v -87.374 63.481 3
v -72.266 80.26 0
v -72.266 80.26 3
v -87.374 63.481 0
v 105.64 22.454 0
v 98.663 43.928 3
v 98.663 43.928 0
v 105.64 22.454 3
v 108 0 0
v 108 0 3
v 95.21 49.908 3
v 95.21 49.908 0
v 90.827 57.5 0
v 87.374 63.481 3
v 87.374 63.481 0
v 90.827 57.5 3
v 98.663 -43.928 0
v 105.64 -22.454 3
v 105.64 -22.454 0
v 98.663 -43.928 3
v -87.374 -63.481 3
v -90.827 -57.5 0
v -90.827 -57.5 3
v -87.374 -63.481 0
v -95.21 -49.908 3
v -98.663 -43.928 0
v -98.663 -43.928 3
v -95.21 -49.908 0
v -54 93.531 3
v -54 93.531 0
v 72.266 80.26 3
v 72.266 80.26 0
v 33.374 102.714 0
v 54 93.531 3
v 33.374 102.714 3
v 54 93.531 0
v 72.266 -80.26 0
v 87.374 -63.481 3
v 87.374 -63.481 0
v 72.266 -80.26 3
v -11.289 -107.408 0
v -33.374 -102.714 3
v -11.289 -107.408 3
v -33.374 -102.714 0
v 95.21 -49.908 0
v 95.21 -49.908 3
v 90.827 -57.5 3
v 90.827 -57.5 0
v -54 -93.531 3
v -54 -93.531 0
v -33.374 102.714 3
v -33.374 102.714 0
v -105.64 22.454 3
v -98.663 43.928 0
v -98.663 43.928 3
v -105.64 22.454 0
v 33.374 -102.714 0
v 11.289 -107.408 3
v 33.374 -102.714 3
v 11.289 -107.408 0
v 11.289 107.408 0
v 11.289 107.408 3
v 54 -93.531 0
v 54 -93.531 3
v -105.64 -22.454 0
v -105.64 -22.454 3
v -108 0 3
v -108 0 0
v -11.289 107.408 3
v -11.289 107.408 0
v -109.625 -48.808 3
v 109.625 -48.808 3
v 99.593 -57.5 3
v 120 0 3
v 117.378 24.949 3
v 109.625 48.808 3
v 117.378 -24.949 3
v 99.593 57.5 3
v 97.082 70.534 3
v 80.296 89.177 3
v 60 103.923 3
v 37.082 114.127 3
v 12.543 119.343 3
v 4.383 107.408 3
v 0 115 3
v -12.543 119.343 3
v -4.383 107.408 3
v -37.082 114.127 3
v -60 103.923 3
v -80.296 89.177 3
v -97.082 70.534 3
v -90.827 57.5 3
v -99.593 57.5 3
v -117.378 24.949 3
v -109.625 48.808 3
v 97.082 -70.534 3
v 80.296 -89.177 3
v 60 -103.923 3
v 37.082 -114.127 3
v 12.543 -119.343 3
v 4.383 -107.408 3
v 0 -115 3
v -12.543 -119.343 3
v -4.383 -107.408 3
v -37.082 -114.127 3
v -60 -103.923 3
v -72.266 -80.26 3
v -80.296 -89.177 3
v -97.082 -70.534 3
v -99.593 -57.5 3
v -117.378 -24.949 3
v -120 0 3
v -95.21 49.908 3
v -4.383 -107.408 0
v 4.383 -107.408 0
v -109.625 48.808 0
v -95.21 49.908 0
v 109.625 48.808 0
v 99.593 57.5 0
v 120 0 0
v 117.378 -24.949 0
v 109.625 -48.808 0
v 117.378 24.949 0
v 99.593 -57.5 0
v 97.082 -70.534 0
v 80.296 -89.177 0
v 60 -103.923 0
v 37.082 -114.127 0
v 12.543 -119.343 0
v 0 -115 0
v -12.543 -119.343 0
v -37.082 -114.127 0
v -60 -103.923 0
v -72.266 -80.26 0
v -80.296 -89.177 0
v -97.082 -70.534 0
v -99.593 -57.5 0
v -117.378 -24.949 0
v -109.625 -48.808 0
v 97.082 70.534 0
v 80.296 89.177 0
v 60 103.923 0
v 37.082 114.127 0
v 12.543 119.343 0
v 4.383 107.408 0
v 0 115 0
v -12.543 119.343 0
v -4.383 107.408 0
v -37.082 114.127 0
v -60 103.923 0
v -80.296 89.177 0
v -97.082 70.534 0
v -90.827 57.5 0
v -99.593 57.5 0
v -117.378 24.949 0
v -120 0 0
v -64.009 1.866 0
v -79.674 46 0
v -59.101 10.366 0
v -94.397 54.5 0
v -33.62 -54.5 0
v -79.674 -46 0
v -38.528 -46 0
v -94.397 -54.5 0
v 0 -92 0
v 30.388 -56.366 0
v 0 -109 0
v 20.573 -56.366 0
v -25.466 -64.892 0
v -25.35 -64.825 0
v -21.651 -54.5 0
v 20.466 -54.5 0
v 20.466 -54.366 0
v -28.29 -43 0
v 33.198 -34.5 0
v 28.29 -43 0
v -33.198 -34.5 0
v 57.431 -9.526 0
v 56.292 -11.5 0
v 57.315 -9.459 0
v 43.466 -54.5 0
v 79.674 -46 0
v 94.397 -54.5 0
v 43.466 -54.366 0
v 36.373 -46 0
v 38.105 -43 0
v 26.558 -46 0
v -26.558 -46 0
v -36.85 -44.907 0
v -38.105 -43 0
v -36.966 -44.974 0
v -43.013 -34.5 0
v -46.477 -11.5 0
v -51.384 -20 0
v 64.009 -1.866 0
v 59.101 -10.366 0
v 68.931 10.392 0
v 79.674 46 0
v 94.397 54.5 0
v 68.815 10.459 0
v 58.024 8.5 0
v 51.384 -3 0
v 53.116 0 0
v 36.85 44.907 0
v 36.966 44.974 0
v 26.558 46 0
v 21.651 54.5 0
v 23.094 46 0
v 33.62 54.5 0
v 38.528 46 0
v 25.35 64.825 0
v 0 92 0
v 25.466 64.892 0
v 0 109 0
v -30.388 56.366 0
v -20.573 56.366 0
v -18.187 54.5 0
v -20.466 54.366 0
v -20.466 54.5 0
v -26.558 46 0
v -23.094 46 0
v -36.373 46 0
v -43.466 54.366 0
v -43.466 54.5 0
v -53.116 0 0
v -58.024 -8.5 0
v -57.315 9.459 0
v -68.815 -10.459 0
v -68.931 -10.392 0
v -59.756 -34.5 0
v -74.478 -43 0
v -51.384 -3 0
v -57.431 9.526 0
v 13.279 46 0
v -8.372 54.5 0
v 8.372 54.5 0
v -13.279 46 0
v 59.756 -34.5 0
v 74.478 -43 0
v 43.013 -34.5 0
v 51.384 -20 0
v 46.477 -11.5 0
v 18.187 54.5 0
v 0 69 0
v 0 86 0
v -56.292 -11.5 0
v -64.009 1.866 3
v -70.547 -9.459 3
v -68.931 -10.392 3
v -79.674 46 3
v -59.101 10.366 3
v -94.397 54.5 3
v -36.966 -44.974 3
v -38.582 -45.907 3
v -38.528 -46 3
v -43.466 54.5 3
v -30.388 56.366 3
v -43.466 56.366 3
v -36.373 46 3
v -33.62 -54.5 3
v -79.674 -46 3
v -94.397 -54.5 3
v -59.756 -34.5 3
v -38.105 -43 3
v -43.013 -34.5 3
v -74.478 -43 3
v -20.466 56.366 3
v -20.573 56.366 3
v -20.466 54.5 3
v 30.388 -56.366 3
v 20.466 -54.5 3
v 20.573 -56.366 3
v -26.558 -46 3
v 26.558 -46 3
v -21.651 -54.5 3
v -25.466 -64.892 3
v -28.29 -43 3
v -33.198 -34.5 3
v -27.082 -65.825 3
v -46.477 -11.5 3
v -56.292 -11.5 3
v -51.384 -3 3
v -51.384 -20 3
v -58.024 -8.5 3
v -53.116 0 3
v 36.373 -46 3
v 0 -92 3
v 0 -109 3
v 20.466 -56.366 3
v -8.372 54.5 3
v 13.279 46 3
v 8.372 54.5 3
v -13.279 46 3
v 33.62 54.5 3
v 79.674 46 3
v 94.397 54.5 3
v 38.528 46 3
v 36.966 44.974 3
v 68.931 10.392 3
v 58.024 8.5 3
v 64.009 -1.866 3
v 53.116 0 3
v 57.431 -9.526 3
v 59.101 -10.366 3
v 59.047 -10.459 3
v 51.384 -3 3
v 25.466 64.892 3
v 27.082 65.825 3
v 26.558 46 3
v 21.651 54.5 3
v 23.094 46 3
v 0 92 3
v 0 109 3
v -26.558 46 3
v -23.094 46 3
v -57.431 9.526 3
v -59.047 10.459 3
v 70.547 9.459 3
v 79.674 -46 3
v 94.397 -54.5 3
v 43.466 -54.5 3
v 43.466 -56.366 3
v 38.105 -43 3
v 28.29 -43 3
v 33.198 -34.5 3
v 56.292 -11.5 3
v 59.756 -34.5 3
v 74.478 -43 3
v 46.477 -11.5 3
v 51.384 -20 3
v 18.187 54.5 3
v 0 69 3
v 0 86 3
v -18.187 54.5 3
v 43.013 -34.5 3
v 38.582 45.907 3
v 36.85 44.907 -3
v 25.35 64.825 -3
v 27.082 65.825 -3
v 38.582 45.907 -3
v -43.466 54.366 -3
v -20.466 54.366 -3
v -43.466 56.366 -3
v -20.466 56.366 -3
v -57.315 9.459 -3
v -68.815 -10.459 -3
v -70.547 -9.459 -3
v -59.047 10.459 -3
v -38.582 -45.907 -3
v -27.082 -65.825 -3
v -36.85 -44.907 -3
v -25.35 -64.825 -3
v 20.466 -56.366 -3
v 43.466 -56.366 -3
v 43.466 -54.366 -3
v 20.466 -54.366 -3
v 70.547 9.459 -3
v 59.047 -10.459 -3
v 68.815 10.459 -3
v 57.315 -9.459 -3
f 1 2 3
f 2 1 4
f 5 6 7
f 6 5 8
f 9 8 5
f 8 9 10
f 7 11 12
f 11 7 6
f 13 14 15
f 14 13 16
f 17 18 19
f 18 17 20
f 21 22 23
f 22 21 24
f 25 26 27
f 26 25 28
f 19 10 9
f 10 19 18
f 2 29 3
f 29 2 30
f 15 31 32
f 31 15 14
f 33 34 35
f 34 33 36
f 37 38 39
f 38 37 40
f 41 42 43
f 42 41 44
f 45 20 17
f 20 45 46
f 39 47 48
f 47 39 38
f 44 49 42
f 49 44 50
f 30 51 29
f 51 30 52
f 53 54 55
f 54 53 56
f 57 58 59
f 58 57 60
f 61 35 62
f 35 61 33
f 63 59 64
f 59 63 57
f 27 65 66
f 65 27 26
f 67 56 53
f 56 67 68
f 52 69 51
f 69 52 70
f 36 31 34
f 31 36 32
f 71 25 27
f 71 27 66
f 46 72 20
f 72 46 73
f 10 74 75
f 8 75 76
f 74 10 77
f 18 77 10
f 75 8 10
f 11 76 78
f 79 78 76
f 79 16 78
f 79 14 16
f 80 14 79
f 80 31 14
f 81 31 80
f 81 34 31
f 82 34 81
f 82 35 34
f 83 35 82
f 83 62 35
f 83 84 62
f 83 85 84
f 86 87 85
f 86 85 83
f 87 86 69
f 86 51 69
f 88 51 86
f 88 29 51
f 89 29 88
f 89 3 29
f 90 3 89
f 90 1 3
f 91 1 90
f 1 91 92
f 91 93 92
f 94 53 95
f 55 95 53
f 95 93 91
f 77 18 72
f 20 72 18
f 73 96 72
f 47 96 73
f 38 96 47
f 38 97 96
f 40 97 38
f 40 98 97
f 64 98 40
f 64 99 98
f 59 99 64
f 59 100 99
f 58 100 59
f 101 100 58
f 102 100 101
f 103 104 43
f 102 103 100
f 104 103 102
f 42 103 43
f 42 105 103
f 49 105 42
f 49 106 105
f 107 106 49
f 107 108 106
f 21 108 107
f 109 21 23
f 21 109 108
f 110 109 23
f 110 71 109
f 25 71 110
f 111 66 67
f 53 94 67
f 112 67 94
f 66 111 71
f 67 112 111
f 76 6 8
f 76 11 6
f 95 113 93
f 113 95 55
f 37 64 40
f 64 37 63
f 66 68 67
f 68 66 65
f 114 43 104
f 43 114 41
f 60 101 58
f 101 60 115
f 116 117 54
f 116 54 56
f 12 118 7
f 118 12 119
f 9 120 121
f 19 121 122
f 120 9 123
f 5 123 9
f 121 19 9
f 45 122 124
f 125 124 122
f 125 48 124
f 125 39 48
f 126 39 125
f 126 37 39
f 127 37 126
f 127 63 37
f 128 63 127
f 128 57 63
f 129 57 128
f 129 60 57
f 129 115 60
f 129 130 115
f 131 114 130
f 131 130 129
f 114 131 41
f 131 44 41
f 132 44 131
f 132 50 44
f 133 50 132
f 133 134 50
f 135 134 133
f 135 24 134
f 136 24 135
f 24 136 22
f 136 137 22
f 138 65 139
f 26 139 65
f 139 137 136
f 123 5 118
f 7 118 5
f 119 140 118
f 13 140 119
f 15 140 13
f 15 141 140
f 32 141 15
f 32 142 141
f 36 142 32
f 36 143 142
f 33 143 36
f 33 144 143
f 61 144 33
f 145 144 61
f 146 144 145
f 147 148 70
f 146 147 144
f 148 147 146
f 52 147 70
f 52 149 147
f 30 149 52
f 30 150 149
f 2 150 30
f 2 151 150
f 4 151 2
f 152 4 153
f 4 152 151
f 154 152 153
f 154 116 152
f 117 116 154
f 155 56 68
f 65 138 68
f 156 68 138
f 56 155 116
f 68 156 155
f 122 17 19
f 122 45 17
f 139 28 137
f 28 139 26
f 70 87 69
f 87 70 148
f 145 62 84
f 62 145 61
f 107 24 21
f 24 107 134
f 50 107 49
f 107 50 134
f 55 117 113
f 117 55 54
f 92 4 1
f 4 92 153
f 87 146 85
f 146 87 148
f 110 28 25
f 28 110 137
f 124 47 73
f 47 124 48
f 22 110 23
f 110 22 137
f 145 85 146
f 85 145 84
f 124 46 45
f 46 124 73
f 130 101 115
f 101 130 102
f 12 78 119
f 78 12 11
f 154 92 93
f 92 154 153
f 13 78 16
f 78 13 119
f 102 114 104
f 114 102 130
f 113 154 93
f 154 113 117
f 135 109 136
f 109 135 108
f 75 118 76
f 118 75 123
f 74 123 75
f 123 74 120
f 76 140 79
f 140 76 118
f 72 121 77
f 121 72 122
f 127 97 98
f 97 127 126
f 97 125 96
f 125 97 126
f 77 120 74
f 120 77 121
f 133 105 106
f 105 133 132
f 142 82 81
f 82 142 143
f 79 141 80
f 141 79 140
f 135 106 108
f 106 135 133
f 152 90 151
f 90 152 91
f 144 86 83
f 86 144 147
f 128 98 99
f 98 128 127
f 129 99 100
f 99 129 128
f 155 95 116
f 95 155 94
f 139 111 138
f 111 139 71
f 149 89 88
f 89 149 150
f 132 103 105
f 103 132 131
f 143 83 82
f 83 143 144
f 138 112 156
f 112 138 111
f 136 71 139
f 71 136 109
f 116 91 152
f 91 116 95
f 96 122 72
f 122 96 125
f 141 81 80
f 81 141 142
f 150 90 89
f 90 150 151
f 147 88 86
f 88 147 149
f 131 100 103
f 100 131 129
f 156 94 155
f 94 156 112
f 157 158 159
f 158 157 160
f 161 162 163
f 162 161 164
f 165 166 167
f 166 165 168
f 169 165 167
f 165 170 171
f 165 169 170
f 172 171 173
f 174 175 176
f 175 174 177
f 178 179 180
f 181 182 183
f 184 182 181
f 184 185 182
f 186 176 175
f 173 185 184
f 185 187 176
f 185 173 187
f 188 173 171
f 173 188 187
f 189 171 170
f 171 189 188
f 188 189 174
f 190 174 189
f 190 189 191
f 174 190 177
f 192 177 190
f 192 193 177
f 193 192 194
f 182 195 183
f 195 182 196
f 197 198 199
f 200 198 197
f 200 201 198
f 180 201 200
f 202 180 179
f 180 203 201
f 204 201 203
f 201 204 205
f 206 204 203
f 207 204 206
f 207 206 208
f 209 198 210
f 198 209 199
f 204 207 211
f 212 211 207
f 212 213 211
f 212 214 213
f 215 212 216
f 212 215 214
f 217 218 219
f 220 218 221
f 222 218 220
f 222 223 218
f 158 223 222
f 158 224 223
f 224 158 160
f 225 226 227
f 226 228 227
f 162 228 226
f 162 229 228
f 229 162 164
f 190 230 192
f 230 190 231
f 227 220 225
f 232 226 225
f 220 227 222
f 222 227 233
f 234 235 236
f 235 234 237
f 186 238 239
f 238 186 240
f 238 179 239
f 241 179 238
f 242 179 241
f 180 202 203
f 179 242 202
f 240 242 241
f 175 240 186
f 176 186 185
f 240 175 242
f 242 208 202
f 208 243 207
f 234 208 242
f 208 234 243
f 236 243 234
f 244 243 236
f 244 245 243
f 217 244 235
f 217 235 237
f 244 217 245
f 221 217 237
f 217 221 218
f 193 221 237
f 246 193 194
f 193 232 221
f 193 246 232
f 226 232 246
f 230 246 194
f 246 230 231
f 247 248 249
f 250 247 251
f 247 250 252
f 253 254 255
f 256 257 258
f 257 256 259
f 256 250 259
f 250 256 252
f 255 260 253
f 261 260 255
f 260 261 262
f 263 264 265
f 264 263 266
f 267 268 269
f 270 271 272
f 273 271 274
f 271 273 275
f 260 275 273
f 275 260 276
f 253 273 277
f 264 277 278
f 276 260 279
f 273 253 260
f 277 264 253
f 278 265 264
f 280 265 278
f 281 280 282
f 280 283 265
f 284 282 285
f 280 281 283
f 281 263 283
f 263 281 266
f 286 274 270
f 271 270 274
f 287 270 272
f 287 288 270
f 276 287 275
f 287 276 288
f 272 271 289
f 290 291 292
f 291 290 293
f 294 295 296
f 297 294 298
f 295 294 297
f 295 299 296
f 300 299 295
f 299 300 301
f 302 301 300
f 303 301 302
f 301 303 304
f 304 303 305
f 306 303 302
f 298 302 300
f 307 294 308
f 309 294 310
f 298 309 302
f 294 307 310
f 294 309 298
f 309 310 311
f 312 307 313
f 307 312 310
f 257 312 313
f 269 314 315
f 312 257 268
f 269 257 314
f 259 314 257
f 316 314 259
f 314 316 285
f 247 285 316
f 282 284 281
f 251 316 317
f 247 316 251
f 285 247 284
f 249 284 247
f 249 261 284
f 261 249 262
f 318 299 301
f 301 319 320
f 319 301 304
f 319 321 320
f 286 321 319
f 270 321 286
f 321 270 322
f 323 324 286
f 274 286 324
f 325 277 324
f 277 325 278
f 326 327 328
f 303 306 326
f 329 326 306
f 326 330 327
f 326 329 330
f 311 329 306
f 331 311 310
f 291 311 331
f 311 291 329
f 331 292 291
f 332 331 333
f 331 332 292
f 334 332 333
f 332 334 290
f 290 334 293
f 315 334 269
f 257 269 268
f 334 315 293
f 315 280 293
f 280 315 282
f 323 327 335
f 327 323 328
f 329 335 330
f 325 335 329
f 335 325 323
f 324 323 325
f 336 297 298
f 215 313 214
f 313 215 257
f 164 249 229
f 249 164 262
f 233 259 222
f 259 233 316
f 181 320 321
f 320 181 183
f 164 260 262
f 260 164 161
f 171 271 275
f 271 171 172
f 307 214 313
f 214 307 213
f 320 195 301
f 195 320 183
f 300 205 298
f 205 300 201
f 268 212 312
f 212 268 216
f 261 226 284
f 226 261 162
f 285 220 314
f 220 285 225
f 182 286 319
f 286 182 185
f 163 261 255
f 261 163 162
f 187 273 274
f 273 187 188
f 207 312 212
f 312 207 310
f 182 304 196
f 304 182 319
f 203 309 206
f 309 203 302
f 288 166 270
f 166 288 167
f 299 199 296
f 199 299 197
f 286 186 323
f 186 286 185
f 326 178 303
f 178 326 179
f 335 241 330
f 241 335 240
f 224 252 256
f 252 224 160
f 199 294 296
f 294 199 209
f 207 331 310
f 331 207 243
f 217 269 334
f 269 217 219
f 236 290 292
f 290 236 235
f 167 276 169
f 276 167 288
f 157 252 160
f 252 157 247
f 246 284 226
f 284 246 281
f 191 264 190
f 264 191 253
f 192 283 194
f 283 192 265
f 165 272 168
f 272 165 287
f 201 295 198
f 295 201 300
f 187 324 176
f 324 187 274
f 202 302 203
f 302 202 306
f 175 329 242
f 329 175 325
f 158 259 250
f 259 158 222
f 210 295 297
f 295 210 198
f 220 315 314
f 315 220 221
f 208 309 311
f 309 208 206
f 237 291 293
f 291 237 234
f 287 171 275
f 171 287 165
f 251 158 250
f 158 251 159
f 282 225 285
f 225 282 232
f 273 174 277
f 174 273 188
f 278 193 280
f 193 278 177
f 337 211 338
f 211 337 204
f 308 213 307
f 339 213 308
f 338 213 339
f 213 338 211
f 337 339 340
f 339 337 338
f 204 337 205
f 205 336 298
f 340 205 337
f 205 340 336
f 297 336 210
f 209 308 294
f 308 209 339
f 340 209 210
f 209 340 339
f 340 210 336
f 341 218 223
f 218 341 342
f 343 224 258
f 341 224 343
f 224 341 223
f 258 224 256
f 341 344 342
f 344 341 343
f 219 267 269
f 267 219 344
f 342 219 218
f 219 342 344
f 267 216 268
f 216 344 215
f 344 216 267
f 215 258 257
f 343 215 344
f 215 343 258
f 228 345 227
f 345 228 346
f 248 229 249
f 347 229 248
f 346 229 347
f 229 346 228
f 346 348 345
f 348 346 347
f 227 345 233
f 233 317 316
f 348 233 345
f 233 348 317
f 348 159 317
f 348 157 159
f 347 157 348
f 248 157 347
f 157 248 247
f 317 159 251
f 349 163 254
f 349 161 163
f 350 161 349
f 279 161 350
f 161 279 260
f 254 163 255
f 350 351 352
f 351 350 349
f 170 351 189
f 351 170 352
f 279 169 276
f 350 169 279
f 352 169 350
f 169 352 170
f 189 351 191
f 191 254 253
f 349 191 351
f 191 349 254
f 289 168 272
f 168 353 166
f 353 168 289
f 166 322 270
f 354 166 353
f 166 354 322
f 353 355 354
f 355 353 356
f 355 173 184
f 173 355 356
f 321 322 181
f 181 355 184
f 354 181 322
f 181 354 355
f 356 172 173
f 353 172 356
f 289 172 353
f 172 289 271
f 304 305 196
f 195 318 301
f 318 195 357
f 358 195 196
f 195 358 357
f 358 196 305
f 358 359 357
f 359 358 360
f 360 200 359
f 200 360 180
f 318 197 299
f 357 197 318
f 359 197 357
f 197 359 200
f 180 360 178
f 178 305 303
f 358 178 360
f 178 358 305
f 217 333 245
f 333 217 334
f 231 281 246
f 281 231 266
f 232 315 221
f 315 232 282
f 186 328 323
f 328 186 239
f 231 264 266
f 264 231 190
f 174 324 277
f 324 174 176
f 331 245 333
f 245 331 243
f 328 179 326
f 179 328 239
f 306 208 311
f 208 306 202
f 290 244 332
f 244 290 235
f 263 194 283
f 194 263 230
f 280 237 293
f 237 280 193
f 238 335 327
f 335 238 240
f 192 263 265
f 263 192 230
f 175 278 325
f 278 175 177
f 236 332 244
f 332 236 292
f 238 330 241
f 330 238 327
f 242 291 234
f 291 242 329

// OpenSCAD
piece_radius = 120;
piece_thickness = 3;
band_thickness = 12;
band_min = 5;
band_gap = 6;
tri_thickness = 17;
tri_gap = 6;
gap = 2;

module triangle(r, h) {
    polyhedron(
        points = [ [0,r,0],
                   [r*cos(30), -1*r*sin(30), 0],
                   [-1*r*cos(30), -1*r*sin(30), 0],
                   [0,r,h],
                   [r*cos(30), -1*r*sin(30), h],
                   [-1*r*cos(30), -1*r*sin(30), h]
                 ],
        triangles = [ [0,1,2], [3,5,4],
                      [0,2,3], [2,5,3],
                      [2,1,5], [1,4,5],
                      [1,0,3], [4,1,3]
                    ]
    );
}

module tri_bar(r, h, t) {
    difference() {
        triangle(r,h);
        triangle(r-t, h);
    }
}

difference() {
    cylinder(r=piece_radius, h=piece_thickness);
    union() {
        cylinder(r=piece_radius - band_thickness, h=piece_thickness);
        triangle(r=piece_radius-band_min, h=piece_thickness);
        rotate([0,0,180]) {
            triangle(r=piece_radius-band_min, h=piece_thickness);
        }
    }
}
tri1_r = piece_radius - band_min - band_gap;
tri2_r = tri1_r - (tri_thickness + tri_gap);
tri3_r = tri2_r - (tri_thickness + tri_gap);
tri4_r = tri3_r - (tri_thickness + tri_gap);

union() {
    tri_bar(r=tri1_r, h=piece_thickness, t=tri_thickness);
    rotate([0,0,180]) {
        tri_bar(r=tri1_r, h=piece_thickness, t=tri_thickness);
    }
}

/* Inside cut-throughs */

r = tri1_r - tri_thickness - gap/2;
x = (r - (r * sin(30))) * tan(30);
y = r * sin(30);
for (angle = [0, 60, 120, 180, 240, 300]) {
    rotate([0,0,angle]) {
        translate([x,y,0]) {
            rotate([0,0,30]) {
                cube(size=[gap,tri_thickness+tri_gap,piece_thickness*2], center=true);
            }
        }
    }
}

/* Outside cut-throughts */
r = tri1_r + cos(30) *gap;
x = (r - (r * sin(30))) * tan(30);
y = r * sin(30);
for (angle = [0, 60, 120, 180, 240, 300]) {
    rotate([0,0,angle]) {
        translate([x,y,0]) {
            rotate([0,0,30]) {
                cube(size=[gap,tri_thickness+tri_gap,piece_thickness*2], center=true);
            }
        }
    }
}

tri_bar(r=tri2_r, h=piece_thickness, t=tri_thickness);
/*
rotate([0,0,180]) {
    tri_bar(r=tri2_r, h=piece_thickness, t=tri_thickness);
}
*/

/*
tri_bar(r=tri3_r, h=piece_thickness, t=tri_thickness);
rotate([0,0,180]) {
    tri_bar(r=tri3_r, h=piece_thickness, t=tri_thickness);
}

tri_bar(r=tri4_r, h=piece_thickness, t=tri_thickness);
rotate([0,0,180]) {
    tri_bar(r=tri4_r, h=piece_thickness, t=tri_thickness);
}
*/
